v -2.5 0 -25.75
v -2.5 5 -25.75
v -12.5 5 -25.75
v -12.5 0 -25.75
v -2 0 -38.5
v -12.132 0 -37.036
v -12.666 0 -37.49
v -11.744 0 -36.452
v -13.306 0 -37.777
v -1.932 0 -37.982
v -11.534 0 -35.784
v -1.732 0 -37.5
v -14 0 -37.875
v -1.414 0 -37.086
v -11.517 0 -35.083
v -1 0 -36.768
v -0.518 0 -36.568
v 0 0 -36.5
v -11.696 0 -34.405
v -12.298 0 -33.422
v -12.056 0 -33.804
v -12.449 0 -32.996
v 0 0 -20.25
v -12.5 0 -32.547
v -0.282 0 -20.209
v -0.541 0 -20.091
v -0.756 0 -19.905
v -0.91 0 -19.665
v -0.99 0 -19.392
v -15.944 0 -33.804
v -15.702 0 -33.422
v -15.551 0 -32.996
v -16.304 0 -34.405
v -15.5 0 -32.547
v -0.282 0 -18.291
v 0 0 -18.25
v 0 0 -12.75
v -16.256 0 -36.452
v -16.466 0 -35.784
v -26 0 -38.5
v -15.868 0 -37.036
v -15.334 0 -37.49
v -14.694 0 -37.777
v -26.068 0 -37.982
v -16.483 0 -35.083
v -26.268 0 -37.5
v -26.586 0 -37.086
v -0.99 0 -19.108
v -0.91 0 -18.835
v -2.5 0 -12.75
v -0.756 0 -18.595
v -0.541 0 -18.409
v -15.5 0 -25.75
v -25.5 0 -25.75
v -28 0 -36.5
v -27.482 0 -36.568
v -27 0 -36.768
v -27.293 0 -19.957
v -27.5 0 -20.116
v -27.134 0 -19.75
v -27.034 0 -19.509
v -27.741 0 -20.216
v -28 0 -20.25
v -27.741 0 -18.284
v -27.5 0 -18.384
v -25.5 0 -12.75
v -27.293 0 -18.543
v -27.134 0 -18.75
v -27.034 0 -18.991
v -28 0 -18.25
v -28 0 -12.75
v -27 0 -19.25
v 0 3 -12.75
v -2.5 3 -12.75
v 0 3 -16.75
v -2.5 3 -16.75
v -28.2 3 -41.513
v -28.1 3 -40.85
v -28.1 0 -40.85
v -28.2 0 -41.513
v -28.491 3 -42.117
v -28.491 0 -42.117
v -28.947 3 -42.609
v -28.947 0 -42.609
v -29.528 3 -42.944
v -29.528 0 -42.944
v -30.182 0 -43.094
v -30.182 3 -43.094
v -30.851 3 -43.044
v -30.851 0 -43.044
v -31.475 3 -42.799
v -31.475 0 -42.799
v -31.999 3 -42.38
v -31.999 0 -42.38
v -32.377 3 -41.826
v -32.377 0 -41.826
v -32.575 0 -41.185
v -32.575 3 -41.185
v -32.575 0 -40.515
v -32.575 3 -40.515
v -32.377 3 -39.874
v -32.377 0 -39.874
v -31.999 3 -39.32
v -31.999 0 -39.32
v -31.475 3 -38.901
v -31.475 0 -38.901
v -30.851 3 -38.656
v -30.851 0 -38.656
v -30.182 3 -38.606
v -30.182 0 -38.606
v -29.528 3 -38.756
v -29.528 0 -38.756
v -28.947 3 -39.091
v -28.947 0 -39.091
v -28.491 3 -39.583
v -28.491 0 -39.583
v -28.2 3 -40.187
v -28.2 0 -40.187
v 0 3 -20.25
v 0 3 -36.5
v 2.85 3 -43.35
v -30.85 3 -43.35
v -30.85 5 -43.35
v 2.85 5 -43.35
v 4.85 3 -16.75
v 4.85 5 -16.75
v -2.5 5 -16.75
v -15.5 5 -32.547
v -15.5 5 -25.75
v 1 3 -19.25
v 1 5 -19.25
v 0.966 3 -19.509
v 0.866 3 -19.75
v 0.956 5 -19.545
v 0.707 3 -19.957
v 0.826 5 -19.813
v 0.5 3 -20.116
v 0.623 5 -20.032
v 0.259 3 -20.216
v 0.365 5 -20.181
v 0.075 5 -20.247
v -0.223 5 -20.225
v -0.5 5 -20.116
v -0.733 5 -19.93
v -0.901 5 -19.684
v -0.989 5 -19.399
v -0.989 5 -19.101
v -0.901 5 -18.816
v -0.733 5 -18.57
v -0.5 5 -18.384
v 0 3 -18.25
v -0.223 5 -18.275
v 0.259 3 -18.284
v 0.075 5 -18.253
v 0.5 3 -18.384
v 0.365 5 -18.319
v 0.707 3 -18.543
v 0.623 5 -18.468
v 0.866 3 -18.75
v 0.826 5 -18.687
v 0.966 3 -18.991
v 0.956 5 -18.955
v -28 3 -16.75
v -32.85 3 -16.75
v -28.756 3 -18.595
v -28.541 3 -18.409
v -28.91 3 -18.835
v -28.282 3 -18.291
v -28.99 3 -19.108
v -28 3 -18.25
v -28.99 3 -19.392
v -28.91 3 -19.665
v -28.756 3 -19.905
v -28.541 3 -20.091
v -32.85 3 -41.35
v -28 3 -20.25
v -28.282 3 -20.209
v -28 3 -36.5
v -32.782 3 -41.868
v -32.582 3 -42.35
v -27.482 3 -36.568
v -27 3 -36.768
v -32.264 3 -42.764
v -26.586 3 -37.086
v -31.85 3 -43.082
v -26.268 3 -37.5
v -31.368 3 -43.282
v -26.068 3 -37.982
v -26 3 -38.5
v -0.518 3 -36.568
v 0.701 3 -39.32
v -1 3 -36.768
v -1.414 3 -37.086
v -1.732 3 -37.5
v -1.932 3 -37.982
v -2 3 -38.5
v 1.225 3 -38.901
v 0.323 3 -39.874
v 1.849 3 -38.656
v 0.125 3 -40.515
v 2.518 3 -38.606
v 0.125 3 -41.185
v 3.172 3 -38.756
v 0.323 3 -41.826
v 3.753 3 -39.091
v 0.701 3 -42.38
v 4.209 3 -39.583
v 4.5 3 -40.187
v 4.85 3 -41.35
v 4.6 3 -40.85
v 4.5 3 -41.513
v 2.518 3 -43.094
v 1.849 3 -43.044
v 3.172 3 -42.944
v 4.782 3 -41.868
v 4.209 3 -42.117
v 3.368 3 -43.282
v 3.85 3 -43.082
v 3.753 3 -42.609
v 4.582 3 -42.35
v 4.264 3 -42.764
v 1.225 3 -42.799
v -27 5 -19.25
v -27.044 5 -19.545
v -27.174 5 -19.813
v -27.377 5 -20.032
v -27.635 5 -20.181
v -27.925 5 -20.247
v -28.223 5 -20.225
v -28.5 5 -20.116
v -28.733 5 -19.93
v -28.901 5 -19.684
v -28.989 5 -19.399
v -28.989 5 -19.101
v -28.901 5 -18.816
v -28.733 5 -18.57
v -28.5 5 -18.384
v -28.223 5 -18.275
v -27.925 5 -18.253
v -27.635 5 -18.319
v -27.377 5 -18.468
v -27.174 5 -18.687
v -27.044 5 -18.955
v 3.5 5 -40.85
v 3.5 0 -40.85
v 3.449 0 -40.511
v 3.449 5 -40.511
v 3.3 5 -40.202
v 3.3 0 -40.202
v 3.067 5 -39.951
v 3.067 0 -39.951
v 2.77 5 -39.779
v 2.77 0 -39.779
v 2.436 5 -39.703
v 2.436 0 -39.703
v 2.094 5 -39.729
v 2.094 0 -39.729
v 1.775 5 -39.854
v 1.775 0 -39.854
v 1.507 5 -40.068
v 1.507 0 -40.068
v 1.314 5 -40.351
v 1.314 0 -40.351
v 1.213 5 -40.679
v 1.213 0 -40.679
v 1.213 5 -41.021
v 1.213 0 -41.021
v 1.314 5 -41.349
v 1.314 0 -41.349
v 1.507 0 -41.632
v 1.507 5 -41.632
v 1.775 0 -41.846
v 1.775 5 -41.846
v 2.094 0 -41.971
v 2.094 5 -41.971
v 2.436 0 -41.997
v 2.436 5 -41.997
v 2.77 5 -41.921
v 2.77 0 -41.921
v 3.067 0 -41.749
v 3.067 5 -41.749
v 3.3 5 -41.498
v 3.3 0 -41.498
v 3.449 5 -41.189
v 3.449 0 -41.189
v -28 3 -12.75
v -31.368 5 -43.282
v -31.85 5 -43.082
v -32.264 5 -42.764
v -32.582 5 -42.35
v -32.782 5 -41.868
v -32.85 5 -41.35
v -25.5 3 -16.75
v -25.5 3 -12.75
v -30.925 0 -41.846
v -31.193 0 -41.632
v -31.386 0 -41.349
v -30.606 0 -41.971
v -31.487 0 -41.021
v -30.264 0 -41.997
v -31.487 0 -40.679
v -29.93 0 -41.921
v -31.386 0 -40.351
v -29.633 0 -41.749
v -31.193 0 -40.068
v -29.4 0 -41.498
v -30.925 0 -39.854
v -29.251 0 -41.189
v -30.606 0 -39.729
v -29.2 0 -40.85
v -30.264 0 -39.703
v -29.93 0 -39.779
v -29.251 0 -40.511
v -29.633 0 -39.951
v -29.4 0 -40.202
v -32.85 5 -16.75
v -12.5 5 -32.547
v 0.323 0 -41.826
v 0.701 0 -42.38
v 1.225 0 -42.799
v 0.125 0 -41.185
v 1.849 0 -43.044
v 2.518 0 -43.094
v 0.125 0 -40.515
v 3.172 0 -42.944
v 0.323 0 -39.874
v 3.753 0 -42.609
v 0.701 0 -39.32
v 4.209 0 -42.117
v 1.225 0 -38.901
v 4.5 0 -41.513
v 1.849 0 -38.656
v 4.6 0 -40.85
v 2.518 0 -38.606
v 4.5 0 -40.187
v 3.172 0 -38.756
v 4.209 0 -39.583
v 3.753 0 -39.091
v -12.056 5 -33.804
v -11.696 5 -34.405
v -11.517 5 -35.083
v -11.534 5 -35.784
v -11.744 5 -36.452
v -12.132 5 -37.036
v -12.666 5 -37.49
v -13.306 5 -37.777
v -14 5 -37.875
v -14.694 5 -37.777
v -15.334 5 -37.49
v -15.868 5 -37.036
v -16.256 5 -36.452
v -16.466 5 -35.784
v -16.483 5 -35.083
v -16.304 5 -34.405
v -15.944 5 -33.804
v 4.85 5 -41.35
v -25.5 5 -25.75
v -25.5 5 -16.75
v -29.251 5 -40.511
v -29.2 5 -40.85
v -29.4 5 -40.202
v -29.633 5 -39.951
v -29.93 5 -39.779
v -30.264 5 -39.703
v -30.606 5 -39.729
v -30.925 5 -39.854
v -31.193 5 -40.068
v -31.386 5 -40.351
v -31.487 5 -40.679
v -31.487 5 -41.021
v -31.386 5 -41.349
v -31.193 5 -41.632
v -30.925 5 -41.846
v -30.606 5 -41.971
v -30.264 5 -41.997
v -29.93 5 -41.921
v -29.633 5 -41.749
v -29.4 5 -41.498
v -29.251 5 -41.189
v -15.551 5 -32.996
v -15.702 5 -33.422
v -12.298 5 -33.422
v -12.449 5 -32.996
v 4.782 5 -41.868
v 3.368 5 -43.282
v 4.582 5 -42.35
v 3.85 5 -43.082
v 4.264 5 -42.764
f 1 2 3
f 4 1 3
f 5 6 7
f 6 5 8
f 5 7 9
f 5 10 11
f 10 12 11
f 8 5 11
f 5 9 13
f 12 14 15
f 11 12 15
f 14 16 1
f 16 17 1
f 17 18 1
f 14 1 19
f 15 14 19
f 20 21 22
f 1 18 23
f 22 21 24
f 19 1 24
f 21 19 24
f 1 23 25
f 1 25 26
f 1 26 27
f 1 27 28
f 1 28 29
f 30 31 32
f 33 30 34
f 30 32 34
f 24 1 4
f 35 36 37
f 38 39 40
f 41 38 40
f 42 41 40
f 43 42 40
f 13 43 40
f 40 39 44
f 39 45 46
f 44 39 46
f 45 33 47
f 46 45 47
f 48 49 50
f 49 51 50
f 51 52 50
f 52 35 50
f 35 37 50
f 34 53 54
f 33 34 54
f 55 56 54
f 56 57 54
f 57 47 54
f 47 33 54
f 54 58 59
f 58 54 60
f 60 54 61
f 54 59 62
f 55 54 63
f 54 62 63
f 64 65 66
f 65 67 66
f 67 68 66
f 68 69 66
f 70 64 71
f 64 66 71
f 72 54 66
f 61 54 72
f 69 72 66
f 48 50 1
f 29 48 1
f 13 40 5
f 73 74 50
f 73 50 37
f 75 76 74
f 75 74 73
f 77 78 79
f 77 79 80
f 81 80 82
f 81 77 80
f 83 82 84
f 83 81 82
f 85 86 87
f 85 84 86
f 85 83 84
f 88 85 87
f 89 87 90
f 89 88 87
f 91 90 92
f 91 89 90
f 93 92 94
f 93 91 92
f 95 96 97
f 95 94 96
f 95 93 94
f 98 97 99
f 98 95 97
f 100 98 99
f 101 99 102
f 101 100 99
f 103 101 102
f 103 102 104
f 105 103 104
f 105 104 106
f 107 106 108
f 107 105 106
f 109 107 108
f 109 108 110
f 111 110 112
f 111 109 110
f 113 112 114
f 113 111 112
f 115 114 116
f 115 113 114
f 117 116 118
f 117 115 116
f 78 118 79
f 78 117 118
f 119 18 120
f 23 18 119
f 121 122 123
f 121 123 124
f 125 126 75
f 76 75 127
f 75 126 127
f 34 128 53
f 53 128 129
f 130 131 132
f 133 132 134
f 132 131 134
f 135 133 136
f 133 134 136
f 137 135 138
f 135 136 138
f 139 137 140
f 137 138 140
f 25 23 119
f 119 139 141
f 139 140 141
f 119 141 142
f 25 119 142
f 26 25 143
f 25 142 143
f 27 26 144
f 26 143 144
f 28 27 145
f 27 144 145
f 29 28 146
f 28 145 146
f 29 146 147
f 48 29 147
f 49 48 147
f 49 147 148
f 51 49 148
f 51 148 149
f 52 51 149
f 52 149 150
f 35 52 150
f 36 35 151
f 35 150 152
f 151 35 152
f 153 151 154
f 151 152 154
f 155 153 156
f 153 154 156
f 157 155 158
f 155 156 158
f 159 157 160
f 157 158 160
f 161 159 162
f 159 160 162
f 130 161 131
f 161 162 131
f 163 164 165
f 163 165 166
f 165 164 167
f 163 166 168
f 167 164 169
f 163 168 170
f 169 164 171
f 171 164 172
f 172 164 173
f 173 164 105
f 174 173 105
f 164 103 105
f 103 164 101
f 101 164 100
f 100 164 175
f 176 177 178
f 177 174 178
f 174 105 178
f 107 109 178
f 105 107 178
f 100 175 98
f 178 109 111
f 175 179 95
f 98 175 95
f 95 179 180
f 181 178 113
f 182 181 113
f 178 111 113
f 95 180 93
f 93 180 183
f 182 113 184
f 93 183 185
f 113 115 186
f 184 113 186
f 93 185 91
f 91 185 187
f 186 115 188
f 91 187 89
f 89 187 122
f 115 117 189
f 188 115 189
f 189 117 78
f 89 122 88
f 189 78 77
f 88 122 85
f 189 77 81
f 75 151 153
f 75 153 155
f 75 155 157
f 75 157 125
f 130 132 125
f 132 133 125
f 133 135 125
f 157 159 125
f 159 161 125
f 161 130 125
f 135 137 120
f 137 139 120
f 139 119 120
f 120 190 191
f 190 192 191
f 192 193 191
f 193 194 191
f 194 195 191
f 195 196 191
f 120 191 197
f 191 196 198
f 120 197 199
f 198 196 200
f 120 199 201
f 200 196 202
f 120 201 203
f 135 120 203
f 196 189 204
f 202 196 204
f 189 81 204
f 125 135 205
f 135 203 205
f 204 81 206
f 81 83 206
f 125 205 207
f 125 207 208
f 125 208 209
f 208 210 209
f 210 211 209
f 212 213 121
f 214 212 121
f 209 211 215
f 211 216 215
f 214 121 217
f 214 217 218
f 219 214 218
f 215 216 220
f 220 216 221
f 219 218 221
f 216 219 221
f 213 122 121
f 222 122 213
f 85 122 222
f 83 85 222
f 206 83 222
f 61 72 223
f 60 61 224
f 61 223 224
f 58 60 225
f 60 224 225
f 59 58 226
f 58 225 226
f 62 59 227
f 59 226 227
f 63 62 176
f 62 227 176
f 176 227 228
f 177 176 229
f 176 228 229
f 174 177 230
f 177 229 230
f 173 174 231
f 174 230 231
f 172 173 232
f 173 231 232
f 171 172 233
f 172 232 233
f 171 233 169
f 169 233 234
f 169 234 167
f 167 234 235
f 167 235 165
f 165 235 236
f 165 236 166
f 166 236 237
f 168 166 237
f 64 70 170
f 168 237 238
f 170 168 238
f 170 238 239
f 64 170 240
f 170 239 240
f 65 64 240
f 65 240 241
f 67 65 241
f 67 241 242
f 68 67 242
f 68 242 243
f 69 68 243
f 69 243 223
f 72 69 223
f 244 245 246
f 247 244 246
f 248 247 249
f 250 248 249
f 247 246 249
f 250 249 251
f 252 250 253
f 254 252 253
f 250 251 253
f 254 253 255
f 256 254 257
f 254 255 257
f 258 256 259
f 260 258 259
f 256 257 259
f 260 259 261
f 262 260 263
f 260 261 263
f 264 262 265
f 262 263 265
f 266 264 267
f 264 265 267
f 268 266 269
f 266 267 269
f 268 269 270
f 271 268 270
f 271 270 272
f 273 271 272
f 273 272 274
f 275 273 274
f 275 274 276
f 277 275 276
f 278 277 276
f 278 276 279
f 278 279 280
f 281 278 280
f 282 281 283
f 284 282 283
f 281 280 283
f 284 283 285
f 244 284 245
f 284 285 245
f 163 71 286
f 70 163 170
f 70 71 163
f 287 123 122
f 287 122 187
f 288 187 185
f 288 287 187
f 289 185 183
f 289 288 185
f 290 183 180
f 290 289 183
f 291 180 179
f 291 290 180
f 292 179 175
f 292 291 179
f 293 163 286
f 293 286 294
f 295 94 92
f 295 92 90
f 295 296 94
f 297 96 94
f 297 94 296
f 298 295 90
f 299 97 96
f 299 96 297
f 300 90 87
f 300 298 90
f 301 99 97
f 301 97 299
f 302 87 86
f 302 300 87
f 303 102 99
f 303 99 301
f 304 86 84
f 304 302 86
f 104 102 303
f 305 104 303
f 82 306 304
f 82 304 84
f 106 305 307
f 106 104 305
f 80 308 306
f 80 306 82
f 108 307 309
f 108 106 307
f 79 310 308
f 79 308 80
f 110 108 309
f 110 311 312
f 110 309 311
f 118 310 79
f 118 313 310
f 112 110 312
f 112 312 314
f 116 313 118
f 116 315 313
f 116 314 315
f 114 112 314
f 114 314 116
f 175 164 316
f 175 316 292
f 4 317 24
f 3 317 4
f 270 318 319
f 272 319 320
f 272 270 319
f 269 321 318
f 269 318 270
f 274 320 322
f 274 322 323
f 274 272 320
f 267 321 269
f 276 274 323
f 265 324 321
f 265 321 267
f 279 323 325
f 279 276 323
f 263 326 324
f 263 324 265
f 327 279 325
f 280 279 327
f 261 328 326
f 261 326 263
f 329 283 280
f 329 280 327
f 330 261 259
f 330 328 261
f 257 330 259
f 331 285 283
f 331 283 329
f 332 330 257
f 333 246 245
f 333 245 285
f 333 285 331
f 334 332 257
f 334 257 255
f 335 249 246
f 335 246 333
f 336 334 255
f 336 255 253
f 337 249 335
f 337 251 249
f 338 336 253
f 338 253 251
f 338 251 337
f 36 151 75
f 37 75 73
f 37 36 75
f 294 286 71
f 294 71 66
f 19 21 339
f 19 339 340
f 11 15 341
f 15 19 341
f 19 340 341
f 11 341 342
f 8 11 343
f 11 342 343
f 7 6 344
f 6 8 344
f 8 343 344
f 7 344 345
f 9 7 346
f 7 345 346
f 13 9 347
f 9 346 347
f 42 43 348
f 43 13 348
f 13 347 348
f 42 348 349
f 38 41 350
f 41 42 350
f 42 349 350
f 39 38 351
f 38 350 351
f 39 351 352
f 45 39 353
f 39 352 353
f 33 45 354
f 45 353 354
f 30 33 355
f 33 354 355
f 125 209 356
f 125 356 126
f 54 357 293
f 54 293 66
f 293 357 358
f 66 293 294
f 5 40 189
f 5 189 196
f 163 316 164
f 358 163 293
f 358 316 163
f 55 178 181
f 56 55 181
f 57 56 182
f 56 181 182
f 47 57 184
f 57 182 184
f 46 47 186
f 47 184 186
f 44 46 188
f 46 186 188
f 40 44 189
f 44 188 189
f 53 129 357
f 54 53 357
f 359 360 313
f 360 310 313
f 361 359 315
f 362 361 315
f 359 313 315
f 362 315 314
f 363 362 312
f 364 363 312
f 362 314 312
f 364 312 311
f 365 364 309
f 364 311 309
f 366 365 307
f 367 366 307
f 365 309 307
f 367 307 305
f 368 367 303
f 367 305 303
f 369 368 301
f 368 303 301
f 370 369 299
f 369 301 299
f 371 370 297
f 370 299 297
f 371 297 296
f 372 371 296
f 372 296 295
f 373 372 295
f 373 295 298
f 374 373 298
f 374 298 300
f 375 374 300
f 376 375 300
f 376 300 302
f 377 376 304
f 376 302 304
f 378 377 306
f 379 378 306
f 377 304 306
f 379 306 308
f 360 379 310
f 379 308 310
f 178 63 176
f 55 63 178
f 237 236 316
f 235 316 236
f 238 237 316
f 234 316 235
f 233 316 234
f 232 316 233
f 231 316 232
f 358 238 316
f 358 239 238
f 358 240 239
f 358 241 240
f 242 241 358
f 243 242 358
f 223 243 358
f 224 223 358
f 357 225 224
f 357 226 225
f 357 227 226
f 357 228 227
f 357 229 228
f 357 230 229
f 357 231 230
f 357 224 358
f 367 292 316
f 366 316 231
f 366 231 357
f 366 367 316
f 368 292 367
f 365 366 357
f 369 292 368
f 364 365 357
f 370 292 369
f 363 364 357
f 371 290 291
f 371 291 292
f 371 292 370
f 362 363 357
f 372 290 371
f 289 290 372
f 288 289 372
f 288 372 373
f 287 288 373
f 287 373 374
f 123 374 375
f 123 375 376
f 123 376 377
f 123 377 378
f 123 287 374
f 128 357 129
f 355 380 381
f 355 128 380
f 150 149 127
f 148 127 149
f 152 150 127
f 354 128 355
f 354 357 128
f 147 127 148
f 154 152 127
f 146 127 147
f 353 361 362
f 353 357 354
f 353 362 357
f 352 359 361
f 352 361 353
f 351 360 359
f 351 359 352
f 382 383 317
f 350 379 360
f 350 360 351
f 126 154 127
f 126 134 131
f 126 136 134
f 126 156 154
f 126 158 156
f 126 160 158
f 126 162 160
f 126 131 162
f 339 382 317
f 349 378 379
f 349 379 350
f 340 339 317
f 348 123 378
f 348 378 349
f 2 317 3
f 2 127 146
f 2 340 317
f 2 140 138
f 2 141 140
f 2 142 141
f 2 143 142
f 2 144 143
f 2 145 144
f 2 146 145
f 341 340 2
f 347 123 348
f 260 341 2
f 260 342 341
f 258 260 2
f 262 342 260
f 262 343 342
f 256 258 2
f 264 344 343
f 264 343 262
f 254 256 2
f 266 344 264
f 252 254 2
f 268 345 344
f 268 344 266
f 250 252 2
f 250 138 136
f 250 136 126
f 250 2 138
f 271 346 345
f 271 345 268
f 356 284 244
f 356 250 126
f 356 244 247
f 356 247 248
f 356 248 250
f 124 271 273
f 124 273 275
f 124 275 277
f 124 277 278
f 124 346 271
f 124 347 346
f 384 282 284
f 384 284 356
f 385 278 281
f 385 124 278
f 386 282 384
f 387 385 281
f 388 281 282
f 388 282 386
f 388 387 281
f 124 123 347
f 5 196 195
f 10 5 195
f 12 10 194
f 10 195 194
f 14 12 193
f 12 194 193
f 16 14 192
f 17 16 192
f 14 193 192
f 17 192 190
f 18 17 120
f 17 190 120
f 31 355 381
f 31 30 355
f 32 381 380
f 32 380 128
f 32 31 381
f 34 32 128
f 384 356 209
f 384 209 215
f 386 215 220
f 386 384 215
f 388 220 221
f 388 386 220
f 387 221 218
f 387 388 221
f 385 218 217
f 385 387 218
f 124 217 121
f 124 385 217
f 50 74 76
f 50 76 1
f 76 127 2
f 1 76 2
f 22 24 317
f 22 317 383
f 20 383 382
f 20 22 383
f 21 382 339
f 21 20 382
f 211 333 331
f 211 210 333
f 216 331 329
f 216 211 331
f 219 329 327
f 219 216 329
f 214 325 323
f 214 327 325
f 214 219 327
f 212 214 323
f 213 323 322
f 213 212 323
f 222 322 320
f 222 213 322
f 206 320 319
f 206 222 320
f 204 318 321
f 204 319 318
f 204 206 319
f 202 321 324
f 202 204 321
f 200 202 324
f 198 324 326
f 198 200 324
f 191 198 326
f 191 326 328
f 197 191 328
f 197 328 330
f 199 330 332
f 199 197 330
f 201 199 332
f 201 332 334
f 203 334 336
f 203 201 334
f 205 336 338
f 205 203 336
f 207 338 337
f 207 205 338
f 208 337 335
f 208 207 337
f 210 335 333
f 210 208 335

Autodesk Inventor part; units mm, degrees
ref_plane "YZ Plane" through (0, 0, 0) normal (1, 0, 0) x (0, 1, 0)
ref_plane "XZ Plane" through (0, 0, 0) normal (0, 1, 0) x (-1, 0, 0)
ref_plane "XY Plane" through (0, 0, 0) normal (0, 0, 1) x (1, 0, 0)
sketch "Sketch1" plane through (0, 0, 0) normal (0, 1, 0) x (-1, 0, 0)
  line L0 (0, 0) -> (28, 0)
  line L1 (28, 0) -> (28, -38.5)
  line L2 (28, -38.5) -> (0, -38.5)
  line L3 (0, -38.5) -> (0, 0)
  dimension "d0" = 28
  dimension "d1" = 38.5
extrude "Extrusion1" add sketch "Sketch1" along normal blind 3
sketch "Sketch2" plane through (0, 3, 0) normal (0, 1, 0) x (1, 0, 0)
  line L0 (-28, 0) -> (0, 0) projected
  circle A0 centre (0, 0) radius 2
  circle A1 centre (-28, 0) radius 2
  line L1 (0, 38.5) -> (-28, 38.5) projected
  circle A2 centre (-28, 38.5) radius 2
  circle A3 centre (0, 38.5) radius 2
  dimension "d8" = 4
  dimension "d9" = 4
  dimension "d10" = 4
  dimension "d11" = 4
extrude "Extrusion2" cut sketch "Sketch2" against normal blind 3
sketch "Sketch3" plane through (0, 3, 0) normal (0, 1, 0) x (1, 0, 0)
  line L0 (-32.85, 43.35) -> (4.85, 43.35)
  line L1 (4.85, 43.35) -> (4.85, -4.85)
  line L2 (4.85, -4.85) -> (-32.85, -4.85)
  line L3 (-32.85, -4.85) -> (-32.85, 43.35)
  line L4 (-2, 38.5) -> (-26, 38.5) projected
  line L5 (0, 2) -> (0, 36.5) projected
  point P0 (0, 0)
  point P1 (-2, 6.25)
  point P2 (-26, 32.25)
  dimension "d14" = 48.2
  dimension "d15" = 37.7
  dimension "d16" = 4.85
  dimension "d17" = 4.85
extrude "Extrusion3" add sketch "Sketch3" along normal blind 2
sketch "Sketch4" plane through (0, 3, 0) normal (0, -1, 0) x (1, 0, 0)
  circle A0 centre (2.35, -40.85) radius 2.25
  line L0 (-2, -38.5) -> (-26, -38.5) projected
  line L1 (0, -2) -> (0, -36.5) projected
  circle A1 centre (-30.35, -40.85) radius 2.25
  line L2 (-28, -36.5) -> (-28, -2) projected
  circle A2 centre (-30.35, 2.35) radius 2.25
  line L3 (-26, 0) -> (-2, 0) projected
  circle A3 centre (2.35, 2.35) radius 2.25
  point P0 (0, 0)
  dimension "d20" = 4.5
  dimension "d21" = 2.35
  dimension "d22" = 2.35
  dimension "d23" = 4.5
  dimension "d24" = 2.35
  dimension "d25" = 2.35
  dimension "d26" = 4.5
  dimension "d27" = 2.35
  dimension "d28" = 4.5
  dimension "d29" = 2.35
  dimension "d30" = 2.35
  dimension "d31" = 2.35
extrude "Extrusion4" add sketch "Sketch4" along normal blind 3
fillet "Fillet1" radius 2 4 edges at (4.85, 4, -43.35) (4.85, 4, 4.85) (-32.85, 4, 4.85) (-32.85, 4, -43.35)
sketch "Sketch5" plane through (0, 5, 0) normal (0, 1, 0) x (1, 0, 0)
  circle A0 centre (0, 19.25) radius 1
  circle A1 centre (-28, 19.25) radius 1
  line L0 (4.85, -2.85) -> (4.85, 41.35) projected
  line L1 (-30.85, -4.85) -> (2.85, -4.85) projected
  point P0 (0, 0)
  dimension "d45" = 2
  dimension "d46" = 2
  dimension "d73" = 28
  dimension "d81" = 24.1
  dimension "d82" = 4.85
extrude "Extrusion6" cut sketch "Sketch5" against normal through all
sketch "Sketch8" plane through (0, 5, 0) normal (0, 1, 0) x (1, 0, 0)
  circle A0 centre (-14, 3.125) radius 1.75
  line L0 (-2, 6.25) -> (-26, 6.25) projected
  line L1 (-26, 0) -> (-2, 0) projected
  line L2 (-32.85, 41.35) -> (-32.85, -2.85) projected
  point P0 (0, 0)
  dimension "d68" = 3.5
  dimension "d69" = 3.125
  dimension "d70" = 18.85
extrude "Extrusion9" cut sketch "Sketch8" against normal through all
sketch "Sketch9" plane through (0, 5, 0) normal (0, 1, 0) x (1, 0, 0)
  circle A0 centre (-14, 3.125) radius 1.75 projected
  line L0 (-15, 4.5611) -> (-15, 6.25)
  line L1 (-15, 6.25) -> (-13, 6.25)
  line L2 (-13, 6.25) -> (-13, 4.5611)
  arc A1 (-13, 4.5611) -> (-15, 4.5611) centre (-14, 3.125) ccw
  line L3 (-2, 6.25) -> (-26, 6.25) projected
  point P0 (0, 0)
  point P1 (-14, 6.25)
  dimension "d76" = 2
  dimension "d77" = 1
extrude "Extrusion10" cut sketch "Sketch9" against normal through all contours A0 L0 L1 L2
fillet "Fillet2" radius 2 2 edges at (-15, 2.5, -4.5611) (-13, 2.5, -4.5611)
sketch "Sketch10" plane through (0, 5, 0) normal (0, 1, 0) x (1, 0, 0)
  line L0 (-25.5, 12.75) -> (-2.5, 12.75)
  line L1 (-2.5, 12.75) -> (-2.5, 25.75)
  line L2 (-2.5, 25.75) -> (-25.5, 25.75)
  line L3 (-25.5, 25.75) -> (-25.5, 12.75)
  line L4 (-32.85, 41.35) -> (-32.85, -2.85) projected
  circle A0 centre (-28, 19.25) radius 1 projected
  point P0 (0, 0)
  dimension "d83" = 23
  dimension "d84" = 13
  dimension "d85" = 7.35
  dimension "d86" = 6.5
extrude "Extrusion11" cut sketch "Sketch10" against normal through all contours L3 L2 L1 L0
sketch "Sketch11" plane through (0, 5, 0) normal (0, 1, 0) x (1, 0, 0)
  line L0 (4.85, -4.85) -> (-32.85, -4.85)
  line L1 (-32.85, -4.85) -> (-32.85, 12.75)
  line L2 (-32.85, 12.75) -> (4.85, 12.75)
  line L3 (4.85, 12.75) -> (4.85, -4.85)
  line L4 (-2.5, 12.75) -> (-25.5, 12.75) projected
  point P0 (0, 0)
  point P1 (-32.85, -2.85)
  point P2 (2.85, -4.85)
  point P3 (4.85, -2.85)
extrude "Extrusion12" cut sketch "Sketch11" against normal through all
sketch "Sketch12" plane through (0, 5, 0) normal (0, 1, 0) x (1, 0, 0)
  circle A0 centre (-14, 35.375) radius 2.5
  line L0 (-2, 38.5) -> (-26, 38.5) projected
  line L1 (4.85, 12.75) -> (4.85, 41.35) projected
  point P0 (0, 0)
  point P1 (-14, 38.5)
  dimension "d92" = 5
  dimension "d93" = 3.125
  dimension "d94" = 18.85
extrude "Extrusion13" cut sketch "Sketch12" against normal through all
sketch "Sketch13" plane through (0, 5, 0) normal (0, 1, 0) x (1, 0, 0)
  circle A0 centre (-14, 35.375) radius 2.5 projected
  line L0 (-15.5, 33.375) -> (-15.5, 25.75)
  line L1 (-2.5, 25.75) -> (-25.5, 25.75) projected
  line L2 (-12.5, 33.375) -> (-12.5, 19.264)
  point P0 (0, 0)
  point P1 (-12.5, 25.75)
  dimension "d97" = 3
extrude "Extrusion14" cut sketch "Sketch13" against normal through all contours A0 L2 L1 L0
fillet "Fillet3" radius 2 2 edges at (-12.5, 2.5, -33.375) (-15.5, 2.5, -33.375)
sketch "Sketch14" plane through (-30.35, 0, -40.85) normal (0, -1, 0) x (1, 0, 0)
  circle A0 centre (32.7, 0) radius 2.25 projected
  circle A1 centre (0, 0) radius 2.25 projected
  circle A2 centre (32.7, 0) radius 1.15
  circle A3 centre (0, 0) radius 1.15
  point P0 (30.35, 40.85)
  dimension "d101" = 2.3
  dimension "d102" = 2.3
extrude "Extrusion15" cut sketch "Sketch14" against normal through all contours A2 | A3
sketch "Sketch16" plane through (0, 5, 0) normal (0, 1, 0) x (1, 0, 0)
  line L0 (-25.5, 25.75) -> (-25.5, 12.75) projected
  line L1 (-32.85, 41.35) -> (-32.85, 12.75) projected
  line L2 (-25.5, 12.75) -> (-32.85, 12.75)
  line L3 (-32.85, 12.75) -> (-32.85, 16.75)
  line L4 (-32.85, 16.75) -> (-25.5, 16.75)
  line L5 (-25.5, 16.75) -> (-25.5, 12.75)
  line L6 (-2.5, 25.75) -> (-2.5, 12.75) projected
  line L7 (4.85, 12.75) -> (4.85, 41.35) projected
  line L8 (-2.5, 12.75) -> (4.85, 12.75)
  line L9 (4.85, 12.75) -> (4.85, 16.75)
  line L10 (4.85, 16.75) -> (-2.5, 16.75)
  line L11 (-2.5, 16.75) -> (-2.5, 12.75)
  point P0 (0, 0)
  point P1 (1.175, 12.75)
  point P2 (-2.5, 16.75)
  dimension "d109" = 4
  dimension "d110" = 4
extrude "Extrusion17" cut sketch "Sketch16" against normal blind 2
properties part number "ServoFullMountInsert"
